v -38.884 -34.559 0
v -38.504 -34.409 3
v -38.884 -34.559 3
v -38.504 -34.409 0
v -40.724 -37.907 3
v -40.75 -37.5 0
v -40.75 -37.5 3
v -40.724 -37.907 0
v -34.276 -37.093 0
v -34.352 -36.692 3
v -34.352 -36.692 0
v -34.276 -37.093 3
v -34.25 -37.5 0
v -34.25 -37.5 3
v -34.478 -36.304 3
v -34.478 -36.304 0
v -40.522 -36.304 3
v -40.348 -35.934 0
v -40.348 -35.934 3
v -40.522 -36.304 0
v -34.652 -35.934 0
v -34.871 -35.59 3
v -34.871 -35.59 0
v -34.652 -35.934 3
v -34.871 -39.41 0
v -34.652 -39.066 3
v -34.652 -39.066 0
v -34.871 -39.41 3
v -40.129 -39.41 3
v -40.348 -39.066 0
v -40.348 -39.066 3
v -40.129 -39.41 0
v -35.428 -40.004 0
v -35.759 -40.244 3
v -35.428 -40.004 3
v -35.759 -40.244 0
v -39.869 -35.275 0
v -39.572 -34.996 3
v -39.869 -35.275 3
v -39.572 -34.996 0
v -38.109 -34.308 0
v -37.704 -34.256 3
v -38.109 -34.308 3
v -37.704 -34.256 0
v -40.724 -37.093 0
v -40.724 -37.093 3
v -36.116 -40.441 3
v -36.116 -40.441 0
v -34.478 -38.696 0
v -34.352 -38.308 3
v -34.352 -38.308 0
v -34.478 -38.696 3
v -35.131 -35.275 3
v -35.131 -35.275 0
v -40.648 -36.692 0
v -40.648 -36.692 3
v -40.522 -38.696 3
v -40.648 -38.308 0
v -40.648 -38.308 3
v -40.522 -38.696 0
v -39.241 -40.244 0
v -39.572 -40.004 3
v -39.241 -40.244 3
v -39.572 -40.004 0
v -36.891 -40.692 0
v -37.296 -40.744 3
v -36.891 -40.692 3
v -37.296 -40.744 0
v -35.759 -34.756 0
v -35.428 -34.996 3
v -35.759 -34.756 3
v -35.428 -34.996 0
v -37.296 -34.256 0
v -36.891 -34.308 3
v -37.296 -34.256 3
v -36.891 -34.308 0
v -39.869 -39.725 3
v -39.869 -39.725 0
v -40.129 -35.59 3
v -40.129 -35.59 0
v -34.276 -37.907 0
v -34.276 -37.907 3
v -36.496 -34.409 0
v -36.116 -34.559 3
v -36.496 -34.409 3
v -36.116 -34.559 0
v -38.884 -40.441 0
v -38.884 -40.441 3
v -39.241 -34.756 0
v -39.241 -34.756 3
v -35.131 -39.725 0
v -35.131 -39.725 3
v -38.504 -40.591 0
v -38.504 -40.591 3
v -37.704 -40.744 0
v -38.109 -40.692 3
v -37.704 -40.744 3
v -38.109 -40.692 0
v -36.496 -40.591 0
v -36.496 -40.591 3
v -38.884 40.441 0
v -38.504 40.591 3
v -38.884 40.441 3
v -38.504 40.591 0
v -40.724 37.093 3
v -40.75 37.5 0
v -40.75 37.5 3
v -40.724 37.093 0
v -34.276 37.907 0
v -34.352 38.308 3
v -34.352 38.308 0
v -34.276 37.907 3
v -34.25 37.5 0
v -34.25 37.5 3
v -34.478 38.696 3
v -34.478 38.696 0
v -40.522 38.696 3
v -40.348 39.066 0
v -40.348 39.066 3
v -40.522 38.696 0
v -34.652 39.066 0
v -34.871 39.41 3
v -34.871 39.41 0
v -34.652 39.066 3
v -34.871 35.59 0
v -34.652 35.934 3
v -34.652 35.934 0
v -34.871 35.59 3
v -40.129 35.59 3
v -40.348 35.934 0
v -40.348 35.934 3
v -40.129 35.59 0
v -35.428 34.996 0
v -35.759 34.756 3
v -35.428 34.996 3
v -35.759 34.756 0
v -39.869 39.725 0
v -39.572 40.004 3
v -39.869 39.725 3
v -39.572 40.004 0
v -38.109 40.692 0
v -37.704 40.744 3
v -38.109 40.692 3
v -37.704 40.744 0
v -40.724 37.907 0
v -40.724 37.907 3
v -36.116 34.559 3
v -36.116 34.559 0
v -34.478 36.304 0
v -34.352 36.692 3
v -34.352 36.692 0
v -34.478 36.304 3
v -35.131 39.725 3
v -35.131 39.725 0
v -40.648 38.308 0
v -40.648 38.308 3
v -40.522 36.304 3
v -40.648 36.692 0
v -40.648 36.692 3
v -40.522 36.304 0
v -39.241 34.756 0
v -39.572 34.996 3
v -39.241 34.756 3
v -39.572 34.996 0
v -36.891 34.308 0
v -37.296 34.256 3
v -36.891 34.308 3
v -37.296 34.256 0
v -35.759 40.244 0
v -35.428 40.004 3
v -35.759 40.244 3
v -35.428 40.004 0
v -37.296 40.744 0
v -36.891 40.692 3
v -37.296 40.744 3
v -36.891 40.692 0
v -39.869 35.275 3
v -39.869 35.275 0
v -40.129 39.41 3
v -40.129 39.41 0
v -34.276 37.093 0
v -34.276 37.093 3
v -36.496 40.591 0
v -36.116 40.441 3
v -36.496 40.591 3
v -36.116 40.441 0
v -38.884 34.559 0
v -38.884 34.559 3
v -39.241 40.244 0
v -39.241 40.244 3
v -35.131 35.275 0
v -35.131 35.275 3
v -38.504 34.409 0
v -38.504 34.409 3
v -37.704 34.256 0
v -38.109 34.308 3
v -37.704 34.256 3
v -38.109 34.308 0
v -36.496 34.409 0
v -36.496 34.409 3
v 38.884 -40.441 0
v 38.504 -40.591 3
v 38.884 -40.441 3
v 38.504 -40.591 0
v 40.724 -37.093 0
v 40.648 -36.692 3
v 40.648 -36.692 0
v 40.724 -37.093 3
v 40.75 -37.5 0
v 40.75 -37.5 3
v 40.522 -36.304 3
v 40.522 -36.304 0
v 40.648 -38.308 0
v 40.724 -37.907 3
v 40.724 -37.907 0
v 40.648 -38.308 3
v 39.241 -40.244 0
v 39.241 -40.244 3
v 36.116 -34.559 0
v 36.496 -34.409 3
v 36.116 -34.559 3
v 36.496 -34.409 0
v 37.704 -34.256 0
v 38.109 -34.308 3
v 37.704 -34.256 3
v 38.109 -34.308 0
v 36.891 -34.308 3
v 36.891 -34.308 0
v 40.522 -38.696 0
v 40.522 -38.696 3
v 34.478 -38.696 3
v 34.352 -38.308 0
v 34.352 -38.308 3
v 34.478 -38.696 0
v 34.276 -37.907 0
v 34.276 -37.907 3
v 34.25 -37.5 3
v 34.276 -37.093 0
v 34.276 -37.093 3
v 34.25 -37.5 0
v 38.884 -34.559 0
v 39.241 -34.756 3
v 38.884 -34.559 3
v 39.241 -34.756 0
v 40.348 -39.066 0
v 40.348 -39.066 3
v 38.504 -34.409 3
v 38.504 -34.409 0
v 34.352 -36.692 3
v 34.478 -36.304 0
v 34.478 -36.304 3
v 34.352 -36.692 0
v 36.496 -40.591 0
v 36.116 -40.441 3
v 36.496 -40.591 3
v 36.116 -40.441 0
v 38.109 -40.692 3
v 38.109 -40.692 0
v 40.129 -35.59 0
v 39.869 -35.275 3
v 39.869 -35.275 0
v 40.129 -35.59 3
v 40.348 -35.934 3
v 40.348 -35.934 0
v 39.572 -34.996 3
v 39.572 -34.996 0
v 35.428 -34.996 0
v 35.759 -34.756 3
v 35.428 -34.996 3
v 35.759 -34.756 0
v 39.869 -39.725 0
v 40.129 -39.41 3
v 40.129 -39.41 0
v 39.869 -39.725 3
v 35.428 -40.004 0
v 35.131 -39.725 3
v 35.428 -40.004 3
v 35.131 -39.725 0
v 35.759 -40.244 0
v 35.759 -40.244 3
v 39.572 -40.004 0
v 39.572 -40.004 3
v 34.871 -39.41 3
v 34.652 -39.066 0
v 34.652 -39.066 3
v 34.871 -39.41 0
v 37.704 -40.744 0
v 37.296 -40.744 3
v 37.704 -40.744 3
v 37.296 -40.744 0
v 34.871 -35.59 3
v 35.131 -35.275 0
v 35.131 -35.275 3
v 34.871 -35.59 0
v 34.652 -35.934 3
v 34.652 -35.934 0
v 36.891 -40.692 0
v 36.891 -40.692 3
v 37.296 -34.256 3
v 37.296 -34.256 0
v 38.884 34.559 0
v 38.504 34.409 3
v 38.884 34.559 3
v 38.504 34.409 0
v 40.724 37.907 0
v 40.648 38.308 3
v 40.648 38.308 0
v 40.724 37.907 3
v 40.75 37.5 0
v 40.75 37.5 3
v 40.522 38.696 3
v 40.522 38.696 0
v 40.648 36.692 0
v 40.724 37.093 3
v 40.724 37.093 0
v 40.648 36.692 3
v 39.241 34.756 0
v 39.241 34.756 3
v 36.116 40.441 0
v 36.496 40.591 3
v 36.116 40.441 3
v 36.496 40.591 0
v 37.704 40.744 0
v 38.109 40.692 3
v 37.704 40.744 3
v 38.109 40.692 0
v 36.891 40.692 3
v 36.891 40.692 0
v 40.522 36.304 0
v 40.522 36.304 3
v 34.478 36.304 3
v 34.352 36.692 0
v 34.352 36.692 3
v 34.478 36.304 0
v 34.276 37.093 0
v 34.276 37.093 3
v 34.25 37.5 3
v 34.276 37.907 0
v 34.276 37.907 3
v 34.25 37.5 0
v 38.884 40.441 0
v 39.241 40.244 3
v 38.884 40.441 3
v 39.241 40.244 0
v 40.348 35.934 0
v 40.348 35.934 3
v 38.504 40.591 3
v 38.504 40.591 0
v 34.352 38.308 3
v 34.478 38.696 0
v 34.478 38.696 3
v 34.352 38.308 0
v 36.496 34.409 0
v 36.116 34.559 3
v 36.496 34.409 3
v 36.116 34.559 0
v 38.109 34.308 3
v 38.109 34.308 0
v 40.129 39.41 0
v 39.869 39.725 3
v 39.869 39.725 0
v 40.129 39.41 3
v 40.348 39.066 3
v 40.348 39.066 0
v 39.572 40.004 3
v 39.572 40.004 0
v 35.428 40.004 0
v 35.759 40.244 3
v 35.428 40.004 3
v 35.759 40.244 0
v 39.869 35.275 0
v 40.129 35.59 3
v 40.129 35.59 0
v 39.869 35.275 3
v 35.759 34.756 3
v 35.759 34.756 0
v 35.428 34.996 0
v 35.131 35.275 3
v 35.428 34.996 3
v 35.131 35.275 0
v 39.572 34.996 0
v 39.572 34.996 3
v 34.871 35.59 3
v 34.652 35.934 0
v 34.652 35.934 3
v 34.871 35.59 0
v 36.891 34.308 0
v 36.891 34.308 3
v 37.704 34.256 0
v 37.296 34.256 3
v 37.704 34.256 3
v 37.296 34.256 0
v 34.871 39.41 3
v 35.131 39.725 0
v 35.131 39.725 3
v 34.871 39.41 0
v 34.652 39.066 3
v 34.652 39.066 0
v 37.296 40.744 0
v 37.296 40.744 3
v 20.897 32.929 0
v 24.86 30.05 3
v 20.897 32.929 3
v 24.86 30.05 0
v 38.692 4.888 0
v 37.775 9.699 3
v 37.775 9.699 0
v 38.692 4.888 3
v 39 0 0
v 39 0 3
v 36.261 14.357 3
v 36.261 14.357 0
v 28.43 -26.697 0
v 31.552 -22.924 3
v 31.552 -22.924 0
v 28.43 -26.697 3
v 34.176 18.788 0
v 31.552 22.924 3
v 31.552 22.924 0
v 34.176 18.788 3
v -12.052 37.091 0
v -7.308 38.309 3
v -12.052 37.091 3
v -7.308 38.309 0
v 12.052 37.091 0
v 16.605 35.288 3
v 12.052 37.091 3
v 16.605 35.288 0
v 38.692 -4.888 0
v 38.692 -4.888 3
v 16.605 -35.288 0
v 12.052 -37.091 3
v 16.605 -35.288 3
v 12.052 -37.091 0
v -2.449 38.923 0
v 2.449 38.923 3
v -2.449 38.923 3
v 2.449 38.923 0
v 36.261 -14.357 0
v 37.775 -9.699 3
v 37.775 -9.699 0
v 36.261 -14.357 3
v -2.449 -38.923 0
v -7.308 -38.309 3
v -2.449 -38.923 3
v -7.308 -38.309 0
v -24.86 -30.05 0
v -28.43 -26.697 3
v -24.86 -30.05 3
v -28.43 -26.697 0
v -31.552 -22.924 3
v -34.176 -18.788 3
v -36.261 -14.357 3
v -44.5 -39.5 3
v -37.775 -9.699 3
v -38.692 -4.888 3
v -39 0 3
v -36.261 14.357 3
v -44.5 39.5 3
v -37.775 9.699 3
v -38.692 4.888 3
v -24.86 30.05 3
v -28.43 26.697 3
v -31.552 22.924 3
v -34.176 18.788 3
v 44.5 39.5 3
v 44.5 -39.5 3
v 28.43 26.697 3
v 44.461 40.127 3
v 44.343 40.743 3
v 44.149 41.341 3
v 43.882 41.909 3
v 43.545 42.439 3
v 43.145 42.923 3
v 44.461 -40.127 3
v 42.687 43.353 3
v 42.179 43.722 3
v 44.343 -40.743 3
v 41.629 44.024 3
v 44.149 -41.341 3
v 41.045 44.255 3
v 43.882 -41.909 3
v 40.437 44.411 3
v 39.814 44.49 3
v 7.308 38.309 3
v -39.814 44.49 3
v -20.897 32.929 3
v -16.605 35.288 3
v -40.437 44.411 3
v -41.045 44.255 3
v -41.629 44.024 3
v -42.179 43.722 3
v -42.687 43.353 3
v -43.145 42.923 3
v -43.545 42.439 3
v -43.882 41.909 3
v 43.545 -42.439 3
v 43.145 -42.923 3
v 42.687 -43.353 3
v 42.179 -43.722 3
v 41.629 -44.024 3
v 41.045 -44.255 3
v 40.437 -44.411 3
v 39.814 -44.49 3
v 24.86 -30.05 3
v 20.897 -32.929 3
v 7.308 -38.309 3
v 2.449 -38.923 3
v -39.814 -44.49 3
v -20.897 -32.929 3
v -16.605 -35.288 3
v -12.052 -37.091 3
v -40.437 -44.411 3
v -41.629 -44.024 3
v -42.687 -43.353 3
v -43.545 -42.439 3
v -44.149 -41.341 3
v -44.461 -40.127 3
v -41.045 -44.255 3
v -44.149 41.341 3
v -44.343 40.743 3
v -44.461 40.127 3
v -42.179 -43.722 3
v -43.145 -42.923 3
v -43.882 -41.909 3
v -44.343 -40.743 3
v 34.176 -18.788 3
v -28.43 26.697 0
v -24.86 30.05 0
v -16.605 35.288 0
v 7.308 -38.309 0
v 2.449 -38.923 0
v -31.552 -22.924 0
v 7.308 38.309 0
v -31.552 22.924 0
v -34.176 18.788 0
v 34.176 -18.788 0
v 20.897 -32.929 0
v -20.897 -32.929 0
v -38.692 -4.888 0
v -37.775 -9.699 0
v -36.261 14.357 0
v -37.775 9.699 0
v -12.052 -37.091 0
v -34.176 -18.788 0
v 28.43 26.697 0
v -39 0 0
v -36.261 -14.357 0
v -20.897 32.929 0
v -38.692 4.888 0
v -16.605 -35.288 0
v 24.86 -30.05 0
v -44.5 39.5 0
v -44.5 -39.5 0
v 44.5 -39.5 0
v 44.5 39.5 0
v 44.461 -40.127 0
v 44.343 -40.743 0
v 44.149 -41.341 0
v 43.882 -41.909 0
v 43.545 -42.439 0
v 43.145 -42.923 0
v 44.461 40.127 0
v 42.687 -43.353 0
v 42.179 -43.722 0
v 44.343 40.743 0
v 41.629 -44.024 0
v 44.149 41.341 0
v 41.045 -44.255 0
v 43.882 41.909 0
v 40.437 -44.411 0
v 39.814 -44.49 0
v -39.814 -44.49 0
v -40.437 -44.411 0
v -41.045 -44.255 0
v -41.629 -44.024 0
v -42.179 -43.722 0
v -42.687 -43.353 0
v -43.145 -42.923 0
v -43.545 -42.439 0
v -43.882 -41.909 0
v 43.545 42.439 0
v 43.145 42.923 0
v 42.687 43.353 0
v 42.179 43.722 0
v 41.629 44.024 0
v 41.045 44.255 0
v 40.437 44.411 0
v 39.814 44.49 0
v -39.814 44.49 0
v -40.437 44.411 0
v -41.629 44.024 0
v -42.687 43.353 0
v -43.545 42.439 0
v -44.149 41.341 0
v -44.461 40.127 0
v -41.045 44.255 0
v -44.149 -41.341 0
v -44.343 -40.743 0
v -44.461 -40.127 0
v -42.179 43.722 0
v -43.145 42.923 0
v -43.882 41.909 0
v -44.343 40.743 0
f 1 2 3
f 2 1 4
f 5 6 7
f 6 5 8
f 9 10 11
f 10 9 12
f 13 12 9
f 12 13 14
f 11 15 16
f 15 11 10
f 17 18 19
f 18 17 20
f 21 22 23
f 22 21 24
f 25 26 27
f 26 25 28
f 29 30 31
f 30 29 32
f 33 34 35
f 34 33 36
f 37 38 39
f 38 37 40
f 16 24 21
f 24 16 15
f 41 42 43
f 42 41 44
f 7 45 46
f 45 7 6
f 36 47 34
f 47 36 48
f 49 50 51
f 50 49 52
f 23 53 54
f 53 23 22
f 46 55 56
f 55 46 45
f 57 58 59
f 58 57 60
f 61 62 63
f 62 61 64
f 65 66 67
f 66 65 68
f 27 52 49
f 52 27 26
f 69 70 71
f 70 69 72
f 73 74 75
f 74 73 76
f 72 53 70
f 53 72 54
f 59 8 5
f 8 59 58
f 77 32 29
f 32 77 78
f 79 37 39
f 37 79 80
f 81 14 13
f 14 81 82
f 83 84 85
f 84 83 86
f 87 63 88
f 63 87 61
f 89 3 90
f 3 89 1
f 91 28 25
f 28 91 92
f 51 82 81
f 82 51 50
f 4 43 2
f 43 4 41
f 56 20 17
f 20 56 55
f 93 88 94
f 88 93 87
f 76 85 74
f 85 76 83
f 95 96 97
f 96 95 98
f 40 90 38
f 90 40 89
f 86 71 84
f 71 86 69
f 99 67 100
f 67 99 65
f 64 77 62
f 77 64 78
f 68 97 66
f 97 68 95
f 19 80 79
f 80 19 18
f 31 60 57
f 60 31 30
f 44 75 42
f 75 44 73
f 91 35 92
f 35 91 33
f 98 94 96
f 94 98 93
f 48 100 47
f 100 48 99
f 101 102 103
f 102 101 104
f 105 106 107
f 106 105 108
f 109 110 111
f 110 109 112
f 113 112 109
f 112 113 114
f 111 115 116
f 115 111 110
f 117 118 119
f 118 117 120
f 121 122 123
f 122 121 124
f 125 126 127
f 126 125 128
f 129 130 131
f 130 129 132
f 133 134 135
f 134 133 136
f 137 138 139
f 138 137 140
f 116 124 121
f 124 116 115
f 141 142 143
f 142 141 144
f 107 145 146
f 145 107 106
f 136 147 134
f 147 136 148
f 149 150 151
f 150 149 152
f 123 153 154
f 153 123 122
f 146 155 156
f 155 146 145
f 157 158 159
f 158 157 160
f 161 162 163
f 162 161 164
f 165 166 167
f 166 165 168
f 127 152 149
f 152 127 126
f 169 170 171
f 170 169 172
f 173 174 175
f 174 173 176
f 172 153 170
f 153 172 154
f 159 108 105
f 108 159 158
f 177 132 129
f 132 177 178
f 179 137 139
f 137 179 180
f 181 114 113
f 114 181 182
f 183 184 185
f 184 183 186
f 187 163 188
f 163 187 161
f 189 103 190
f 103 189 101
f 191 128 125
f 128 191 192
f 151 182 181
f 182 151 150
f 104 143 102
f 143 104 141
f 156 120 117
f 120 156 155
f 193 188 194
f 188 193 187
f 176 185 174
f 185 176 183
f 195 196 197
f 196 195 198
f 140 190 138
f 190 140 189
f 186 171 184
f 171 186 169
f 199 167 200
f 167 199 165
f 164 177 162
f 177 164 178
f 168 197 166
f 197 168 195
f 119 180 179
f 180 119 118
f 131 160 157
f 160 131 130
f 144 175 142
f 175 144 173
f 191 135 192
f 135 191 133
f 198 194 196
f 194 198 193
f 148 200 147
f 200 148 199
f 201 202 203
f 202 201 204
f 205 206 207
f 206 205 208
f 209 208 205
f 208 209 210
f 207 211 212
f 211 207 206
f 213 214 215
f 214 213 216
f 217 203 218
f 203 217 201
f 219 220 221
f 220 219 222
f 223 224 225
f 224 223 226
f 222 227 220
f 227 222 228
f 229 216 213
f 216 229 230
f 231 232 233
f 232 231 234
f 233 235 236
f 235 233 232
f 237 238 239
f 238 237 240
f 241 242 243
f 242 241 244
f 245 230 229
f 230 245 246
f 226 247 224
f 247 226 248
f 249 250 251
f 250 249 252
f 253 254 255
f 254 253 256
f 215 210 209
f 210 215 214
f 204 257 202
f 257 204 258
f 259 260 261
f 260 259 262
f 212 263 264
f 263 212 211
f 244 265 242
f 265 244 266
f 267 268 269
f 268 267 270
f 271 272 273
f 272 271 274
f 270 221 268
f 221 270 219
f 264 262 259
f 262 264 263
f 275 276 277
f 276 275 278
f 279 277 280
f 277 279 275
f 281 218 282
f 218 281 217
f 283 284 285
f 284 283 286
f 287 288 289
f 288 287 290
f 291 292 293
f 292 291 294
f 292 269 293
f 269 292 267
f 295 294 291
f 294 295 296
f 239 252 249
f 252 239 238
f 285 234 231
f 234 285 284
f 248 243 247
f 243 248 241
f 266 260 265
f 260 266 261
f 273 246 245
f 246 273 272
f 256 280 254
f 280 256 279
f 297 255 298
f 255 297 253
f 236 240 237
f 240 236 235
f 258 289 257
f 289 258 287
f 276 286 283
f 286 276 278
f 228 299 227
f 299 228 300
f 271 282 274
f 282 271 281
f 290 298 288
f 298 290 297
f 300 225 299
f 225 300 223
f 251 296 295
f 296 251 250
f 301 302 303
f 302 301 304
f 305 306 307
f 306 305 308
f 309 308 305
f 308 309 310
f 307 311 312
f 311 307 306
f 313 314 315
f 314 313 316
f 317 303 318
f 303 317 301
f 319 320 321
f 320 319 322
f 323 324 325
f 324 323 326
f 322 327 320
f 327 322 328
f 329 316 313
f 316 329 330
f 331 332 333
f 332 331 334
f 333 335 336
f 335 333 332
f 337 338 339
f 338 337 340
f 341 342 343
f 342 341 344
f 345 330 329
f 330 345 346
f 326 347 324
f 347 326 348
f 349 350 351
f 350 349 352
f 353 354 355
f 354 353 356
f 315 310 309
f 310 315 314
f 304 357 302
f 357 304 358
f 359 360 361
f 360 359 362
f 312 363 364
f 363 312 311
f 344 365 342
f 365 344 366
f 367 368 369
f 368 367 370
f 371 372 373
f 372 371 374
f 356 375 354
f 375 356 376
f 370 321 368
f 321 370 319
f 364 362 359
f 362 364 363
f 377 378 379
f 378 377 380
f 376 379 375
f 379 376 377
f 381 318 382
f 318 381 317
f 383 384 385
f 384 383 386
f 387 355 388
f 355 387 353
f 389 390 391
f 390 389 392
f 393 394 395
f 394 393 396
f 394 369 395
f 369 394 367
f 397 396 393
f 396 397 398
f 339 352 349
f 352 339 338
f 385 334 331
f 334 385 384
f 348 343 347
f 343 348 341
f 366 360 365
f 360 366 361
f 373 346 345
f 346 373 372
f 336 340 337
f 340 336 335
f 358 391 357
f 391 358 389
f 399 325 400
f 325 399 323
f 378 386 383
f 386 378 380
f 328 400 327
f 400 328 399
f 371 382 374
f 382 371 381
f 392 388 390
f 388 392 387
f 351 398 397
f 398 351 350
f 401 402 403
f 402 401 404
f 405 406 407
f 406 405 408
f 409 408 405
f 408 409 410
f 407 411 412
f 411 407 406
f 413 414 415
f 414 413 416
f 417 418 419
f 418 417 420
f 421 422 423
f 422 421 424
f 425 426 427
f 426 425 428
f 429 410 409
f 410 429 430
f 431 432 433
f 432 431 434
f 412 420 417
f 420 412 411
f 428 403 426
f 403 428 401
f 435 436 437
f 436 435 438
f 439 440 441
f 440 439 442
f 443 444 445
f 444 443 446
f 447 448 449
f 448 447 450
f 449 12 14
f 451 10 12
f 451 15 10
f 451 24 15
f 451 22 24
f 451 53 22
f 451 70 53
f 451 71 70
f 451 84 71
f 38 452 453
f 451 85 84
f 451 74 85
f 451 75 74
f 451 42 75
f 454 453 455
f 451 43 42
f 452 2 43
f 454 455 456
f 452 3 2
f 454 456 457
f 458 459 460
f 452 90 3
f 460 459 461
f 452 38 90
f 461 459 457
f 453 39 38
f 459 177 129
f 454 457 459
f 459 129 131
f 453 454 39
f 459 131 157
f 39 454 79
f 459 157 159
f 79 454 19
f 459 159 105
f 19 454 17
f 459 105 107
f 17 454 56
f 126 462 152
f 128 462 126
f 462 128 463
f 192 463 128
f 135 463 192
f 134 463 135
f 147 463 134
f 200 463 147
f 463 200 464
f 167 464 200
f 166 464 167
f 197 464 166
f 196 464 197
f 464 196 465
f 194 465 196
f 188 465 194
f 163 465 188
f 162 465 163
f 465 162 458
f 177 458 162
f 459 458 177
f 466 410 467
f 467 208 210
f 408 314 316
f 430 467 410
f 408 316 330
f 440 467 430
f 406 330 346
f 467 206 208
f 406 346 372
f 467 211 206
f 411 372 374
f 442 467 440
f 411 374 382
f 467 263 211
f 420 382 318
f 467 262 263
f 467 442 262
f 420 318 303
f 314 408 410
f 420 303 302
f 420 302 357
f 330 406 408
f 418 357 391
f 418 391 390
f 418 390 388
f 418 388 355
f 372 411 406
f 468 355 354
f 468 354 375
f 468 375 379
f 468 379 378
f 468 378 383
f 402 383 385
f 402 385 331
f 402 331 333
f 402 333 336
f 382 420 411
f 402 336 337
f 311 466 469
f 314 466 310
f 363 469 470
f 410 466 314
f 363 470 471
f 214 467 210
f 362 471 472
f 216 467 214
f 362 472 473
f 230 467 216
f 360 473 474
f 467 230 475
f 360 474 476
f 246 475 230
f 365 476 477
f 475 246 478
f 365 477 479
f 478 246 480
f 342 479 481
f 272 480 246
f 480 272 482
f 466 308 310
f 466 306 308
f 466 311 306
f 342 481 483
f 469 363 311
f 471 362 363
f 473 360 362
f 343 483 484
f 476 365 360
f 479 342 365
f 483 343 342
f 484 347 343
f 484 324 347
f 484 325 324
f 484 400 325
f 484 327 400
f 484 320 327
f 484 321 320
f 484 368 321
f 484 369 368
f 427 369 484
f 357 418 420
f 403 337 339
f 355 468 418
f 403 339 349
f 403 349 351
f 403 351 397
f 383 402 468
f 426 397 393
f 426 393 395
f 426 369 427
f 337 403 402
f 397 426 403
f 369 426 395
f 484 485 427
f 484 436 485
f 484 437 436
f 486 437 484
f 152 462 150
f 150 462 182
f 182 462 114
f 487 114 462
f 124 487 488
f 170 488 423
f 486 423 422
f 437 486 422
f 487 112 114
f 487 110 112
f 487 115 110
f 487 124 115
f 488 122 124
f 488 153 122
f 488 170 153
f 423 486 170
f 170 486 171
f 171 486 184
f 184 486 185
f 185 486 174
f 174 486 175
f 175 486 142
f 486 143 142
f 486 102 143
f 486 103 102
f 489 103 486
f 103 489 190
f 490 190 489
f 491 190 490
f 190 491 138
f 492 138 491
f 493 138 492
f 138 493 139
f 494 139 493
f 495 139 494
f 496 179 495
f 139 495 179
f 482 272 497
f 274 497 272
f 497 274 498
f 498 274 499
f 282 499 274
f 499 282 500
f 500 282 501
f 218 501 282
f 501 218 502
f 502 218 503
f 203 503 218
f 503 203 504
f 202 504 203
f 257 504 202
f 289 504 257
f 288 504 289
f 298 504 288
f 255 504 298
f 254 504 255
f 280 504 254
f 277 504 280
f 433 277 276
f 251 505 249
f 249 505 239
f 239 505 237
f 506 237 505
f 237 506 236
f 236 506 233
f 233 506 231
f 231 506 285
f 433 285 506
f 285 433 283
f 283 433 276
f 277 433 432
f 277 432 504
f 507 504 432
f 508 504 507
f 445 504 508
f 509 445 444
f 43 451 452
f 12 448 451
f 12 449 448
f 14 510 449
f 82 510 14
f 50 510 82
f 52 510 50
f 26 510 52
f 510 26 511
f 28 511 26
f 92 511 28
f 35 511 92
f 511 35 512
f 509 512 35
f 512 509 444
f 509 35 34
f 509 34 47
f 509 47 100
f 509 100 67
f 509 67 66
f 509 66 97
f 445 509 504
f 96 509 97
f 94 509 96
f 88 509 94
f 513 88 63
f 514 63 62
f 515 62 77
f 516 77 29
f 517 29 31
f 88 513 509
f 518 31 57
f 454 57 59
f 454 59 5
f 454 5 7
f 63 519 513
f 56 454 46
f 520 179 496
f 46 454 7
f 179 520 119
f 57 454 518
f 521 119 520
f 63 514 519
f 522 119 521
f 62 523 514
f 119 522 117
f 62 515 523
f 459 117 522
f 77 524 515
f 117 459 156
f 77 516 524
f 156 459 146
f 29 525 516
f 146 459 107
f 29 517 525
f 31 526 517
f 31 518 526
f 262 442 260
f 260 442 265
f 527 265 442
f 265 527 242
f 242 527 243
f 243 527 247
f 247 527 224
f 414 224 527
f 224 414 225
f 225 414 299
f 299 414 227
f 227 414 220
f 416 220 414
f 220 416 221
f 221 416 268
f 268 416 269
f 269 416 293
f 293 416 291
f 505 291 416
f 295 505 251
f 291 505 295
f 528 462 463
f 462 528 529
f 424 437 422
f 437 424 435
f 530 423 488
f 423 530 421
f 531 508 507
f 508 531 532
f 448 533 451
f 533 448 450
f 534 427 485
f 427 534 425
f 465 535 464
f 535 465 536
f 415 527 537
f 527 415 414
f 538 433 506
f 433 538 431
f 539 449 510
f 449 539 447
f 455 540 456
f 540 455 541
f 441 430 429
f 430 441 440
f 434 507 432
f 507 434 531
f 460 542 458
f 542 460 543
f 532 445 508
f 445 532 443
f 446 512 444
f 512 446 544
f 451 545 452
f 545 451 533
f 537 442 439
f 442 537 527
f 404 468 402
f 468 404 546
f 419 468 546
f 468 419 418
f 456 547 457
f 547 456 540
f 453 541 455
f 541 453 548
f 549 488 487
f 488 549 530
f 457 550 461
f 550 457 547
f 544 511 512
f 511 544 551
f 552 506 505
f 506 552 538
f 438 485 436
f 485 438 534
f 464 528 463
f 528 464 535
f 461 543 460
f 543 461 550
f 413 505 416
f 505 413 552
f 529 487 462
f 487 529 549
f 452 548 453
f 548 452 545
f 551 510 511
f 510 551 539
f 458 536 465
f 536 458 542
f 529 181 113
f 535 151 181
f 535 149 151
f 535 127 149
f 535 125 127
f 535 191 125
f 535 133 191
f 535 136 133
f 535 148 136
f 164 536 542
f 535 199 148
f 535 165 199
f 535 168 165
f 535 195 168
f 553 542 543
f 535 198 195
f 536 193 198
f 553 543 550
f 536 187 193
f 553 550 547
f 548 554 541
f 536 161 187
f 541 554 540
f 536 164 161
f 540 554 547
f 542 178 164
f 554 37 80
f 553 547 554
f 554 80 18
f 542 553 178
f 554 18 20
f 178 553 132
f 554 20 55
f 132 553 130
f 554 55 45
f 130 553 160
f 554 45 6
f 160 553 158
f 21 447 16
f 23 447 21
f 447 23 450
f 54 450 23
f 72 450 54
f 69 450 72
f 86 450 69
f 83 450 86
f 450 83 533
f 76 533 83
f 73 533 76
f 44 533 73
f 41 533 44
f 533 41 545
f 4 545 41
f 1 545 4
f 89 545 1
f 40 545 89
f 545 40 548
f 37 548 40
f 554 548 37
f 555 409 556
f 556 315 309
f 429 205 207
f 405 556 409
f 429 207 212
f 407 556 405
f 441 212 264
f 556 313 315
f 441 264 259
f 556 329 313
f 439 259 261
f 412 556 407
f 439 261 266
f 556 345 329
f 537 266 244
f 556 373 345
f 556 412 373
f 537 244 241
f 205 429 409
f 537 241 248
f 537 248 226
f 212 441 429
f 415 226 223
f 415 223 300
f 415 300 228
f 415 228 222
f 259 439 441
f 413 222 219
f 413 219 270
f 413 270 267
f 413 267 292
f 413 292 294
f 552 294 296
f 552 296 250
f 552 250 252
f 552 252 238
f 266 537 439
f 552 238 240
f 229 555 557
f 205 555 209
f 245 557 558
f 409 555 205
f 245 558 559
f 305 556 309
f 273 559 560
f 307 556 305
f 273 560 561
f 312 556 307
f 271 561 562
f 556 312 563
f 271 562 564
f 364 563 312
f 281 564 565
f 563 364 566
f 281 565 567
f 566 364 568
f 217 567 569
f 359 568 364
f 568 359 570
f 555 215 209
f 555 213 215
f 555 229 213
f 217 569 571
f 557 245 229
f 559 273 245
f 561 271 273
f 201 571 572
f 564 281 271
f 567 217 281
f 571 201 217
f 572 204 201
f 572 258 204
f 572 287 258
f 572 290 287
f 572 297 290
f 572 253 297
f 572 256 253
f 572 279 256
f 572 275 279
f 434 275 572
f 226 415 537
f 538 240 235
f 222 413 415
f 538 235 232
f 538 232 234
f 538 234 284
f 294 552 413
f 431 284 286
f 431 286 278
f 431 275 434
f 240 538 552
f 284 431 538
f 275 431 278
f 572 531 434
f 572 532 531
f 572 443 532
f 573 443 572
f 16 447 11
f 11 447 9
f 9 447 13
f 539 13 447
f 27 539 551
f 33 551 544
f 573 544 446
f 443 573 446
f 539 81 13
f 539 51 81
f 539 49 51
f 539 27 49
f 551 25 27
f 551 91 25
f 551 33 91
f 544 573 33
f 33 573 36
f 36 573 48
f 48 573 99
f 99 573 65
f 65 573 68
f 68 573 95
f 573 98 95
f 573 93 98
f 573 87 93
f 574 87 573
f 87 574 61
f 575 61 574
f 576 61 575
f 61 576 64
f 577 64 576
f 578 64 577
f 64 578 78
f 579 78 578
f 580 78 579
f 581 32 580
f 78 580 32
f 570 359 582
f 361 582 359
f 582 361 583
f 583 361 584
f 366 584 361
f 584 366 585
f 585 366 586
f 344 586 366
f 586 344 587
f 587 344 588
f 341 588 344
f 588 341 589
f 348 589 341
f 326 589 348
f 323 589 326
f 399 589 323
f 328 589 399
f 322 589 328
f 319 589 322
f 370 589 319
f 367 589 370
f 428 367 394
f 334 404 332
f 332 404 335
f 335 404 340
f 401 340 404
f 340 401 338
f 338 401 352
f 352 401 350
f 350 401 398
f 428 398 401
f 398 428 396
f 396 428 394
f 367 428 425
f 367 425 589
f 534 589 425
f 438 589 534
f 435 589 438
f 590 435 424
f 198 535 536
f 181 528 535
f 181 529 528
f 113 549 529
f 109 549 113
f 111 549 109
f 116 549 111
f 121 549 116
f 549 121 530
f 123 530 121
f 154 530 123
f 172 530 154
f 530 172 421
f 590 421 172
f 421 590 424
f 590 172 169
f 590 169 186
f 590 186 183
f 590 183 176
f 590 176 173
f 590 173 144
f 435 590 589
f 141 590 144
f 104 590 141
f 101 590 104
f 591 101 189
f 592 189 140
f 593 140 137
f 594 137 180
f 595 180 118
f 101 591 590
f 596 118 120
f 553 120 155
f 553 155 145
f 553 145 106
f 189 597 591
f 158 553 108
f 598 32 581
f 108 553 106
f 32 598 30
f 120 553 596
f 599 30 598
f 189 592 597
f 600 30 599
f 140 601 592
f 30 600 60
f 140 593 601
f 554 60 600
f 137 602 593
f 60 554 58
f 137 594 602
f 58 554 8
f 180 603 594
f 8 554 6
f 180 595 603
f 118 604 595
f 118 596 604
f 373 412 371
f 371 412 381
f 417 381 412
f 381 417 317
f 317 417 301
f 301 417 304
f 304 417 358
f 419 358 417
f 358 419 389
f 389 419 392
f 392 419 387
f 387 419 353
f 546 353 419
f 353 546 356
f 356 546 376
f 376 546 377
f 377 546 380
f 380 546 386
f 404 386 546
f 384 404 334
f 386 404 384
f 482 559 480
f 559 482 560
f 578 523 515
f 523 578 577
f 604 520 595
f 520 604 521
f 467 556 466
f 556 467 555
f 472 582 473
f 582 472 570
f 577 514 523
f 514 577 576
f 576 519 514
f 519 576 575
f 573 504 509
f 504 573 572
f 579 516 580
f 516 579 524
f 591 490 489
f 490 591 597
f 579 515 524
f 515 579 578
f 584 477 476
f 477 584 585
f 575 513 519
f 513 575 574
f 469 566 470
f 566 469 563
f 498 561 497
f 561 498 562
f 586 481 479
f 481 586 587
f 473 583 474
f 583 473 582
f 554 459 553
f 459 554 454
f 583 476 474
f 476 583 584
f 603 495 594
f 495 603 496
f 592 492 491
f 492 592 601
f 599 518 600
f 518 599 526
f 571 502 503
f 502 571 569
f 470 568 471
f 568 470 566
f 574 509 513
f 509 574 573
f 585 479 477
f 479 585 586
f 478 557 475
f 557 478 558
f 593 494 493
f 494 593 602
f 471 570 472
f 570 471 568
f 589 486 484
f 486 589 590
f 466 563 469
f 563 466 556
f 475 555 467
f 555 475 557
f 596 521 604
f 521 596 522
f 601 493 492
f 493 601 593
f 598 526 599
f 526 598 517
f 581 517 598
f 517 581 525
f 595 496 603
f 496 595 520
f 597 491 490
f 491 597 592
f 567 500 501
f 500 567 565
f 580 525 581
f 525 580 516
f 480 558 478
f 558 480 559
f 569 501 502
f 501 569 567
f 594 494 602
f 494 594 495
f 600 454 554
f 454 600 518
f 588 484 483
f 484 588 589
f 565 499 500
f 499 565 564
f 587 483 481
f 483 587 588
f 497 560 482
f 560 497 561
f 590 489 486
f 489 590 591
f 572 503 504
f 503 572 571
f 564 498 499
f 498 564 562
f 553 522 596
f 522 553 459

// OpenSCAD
$fn = 50;

difference() {
	union() {
		hull() {
			translate(v = [-39.5, 39.5, 0]) {
				cylinder(h = 3, r = 5);
			}
			translate(v = [39.5, 39.5, 0]) {
				cylinder(h = 3, r = 5);
			}
			translate(v = [-39.5, -39.5, 0]) {
				cylinder(h = 3, r = 5);
			}
			translate(v = [39.5, -39.5, 0]) {
				cylinder(h = 3, r = 5);
			}
		}
	}
	union() {
		translate(v = [-37.5, -37.5, -100.0]) {
			cylinder(h = 200, r = 3.25);
		}
		translate(v = [-37.5, 37.5, -100.0]) {
			cylinder(h = 200, r = 3.25);
		}
		translate(v = [37.5, -37.5, -100.0]) {
			cylinder(h = 200, r = 3.25);
		}
		translate(v = [37.5, 37.5, -100.0]) {
			cylinder(h = 200, r = 3.25);
		}
		translate(v = [-37.5, -37.5, -100.0]) {
			cylinder(h = 200, r = 1.8);
		}
		translate(v = [-37.5, 37.5, -100.0]) {
			cylinder(h = 200, r = 1.8);
		}
		translate(v = [37.5, -37.5, -100.0]) {
			cylinder(h = 200, r = 1.8);
		}
		translate(v = [37.5, 37.5, -100.0]) {
			cylinder(h = 200, r = 1.8);
		}
		cylinder(h = 3, r = 39.0);
	}
}
